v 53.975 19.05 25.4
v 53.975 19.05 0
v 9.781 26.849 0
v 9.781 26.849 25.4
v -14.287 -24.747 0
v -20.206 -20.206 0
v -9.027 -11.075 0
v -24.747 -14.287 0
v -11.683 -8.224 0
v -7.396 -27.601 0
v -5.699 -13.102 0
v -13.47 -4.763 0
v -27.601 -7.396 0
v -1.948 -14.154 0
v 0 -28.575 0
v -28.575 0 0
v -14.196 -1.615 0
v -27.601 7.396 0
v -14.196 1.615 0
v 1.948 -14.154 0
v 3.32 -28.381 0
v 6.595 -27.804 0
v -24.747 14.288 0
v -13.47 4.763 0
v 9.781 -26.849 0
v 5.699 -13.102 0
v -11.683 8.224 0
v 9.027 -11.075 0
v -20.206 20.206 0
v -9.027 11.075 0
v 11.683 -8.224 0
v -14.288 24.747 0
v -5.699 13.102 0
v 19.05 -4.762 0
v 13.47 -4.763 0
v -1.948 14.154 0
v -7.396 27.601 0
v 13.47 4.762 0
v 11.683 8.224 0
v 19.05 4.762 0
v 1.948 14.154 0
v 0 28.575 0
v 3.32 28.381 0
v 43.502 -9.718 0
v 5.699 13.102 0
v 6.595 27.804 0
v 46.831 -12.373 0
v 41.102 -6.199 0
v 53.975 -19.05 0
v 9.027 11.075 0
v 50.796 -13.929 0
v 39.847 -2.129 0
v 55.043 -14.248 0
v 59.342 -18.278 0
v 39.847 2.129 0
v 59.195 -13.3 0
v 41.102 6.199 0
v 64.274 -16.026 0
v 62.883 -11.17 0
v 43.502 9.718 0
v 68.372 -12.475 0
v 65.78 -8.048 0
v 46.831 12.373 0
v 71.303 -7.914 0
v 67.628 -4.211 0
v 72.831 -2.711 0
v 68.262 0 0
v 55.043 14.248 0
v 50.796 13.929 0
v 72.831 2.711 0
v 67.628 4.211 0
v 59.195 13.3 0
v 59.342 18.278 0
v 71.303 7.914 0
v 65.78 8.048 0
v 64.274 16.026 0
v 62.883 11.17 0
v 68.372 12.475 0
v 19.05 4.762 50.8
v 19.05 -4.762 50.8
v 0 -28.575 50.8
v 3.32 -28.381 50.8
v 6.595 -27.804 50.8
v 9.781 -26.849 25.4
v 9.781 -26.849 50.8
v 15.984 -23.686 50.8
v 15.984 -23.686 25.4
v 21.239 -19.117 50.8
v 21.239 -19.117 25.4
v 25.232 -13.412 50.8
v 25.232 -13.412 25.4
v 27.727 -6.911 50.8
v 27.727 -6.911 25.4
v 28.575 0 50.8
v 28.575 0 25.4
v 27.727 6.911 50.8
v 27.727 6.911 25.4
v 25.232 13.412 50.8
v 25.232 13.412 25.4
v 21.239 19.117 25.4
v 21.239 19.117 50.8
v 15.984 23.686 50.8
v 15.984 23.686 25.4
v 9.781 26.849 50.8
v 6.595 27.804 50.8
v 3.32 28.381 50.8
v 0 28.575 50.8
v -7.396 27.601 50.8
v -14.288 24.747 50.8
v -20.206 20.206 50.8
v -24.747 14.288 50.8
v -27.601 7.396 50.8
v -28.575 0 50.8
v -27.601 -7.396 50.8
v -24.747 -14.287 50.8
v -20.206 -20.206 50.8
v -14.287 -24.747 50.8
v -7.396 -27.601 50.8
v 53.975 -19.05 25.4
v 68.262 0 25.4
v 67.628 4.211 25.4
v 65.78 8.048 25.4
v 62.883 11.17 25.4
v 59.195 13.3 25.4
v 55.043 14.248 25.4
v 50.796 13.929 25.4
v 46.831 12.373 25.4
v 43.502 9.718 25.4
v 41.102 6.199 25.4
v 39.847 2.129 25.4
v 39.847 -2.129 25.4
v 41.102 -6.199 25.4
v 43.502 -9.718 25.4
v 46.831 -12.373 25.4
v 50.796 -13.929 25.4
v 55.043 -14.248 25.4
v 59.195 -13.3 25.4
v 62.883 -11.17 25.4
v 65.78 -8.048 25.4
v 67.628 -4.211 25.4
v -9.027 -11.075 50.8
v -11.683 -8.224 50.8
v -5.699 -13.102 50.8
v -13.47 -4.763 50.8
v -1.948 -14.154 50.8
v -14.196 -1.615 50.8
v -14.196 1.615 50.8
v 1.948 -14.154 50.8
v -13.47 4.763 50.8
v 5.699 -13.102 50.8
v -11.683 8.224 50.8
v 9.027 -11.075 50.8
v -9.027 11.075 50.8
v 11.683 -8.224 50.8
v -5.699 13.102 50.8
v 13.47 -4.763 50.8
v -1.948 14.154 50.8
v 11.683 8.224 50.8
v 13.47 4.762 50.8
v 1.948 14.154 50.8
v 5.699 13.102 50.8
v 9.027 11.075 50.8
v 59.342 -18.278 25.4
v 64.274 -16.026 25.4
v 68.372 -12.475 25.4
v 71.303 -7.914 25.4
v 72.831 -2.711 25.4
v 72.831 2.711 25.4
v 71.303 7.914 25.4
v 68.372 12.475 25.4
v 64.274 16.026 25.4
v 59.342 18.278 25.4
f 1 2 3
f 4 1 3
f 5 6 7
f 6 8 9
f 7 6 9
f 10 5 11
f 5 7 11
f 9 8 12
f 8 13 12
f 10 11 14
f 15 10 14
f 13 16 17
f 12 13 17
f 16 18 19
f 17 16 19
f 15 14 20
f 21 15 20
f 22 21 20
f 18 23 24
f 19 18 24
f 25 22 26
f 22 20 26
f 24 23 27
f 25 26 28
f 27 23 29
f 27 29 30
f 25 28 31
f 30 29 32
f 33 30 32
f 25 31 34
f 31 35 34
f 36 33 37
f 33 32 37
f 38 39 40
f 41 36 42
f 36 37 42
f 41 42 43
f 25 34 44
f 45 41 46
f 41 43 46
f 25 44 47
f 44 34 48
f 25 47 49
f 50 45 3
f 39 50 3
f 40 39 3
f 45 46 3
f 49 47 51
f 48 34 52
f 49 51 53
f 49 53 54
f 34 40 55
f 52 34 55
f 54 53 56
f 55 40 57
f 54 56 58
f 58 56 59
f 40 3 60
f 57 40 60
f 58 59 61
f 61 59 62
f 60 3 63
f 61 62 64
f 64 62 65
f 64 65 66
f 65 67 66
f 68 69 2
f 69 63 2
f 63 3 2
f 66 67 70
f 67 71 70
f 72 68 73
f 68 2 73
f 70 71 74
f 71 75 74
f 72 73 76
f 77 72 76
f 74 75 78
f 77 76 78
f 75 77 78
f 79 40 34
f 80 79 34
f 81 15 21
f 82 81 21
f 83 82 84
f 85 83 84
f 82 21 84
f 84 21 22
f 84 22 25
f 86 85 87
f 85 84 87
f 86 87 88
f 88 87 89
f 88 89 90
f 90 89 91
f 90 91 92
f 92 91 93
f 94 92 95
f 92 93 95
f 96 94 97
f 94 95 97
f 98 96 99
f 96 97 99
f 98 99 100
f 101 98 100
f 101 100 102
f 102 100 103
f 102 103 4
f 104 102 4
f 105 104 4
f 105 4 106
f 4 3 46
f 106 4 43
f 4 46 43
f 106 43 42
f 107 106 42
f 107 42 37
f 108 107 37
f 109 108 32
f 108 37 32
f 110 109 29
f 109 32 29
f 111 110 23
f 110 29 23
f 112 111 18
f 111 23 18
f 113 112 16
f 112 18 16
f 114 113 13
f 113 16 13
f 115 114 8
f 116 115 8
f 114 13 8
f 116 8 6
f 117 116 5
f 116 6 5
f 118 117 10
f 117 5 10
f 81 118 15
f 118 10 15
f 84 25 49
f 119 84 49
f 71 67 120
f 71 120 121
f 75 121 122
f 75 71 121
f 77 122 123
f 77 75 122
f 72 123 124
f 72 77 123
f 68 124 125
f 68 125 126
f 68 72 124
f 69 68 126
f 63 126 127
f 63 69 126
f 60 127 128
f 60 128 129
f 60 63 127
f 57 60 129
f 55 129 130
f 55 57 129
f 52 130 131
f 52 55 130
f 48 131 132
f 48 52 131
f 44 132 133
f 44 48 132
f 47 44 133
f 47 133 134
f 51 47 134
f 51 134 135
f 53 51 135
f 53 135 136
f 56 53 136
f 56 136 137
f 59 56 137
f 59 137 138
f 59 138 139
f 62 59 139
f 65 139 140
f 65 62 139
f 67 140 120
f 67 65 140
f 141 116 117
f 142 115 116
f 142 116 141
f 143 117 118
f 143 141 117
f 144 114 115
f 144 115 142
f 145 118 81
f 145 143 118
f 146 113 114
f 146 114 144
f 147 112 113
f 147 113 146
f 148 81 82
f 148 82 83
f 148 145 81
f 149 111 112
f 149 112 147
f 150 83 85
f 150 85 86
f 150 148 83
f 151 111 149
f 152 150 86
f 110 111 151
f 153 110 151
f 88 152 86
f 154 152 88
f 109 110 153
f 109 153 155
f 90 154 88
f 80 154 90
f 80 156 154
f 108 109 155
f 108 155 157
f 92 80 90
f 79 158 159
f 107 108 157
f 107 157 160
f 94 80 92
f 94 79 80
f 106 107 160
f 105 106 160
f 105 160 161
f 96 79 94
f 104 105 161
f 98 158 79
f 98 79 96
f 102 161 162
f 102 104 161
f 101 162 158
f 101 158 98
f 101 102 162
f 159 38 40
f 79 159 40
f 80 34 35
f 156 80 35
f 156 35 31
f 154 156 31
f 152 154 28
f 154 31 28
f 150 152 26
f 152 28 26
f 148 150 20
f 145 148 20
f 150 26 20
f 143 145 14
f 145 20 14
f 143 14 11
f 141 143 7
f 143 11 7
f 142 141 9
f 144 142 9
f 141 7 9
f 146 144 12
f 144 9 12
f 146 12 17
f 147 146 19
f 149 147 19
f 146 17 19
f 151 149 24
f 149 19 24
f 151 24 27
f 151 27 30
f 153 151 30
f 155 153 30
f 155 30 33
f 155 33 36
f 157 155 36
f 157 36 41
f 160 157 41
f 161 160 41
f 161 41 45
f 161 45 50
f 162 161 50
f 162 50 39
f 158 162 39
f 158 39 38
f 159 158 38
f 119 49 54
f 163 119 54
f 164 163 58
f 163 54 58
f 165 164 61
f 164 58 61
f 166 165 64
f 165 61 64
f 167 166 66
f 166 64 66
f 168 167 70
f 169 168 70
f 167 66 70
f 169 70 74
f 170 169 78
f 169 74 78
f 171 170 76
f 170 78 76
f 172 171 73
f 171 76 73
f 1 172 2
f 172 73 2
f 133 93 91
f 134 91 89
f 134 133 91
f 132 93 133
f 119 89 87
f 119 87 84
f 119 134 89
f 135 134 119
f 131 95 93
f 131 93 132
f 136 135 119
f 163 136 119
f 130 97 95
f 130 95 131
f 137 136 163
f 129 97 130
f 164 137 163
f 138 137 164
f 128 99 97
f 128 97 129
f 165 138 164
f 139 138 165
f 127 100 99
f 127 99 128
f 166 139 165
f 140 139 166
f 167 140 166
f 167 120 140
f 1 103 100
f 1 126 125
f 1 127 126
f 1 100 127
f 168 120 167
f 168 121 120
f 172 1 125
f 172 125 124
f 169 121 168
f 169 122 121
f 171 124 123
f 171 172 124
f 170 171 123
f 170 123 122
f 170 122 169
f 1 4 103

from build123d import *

# Parameters (mm, degrees)
F0_R     = 14.2875
F1_DEPTH = 25.4
F2_DEPTH = 50.8


with BuildPart() as f1:
    # F0 (on Top) → F1 (new body)
    with BuildSketch(Plane.XY):
        with BuildLine():
            Line((9.780704698, 26.8489932886), (0, 28.575))
            ThreePointArc((0, 28.575), (-28.575, 0), (0, -28.575))
            Line((0, -28.575), (9.780704698, -26.8489932886))
            ThreePointArc((9.780704698, -26.8489932886), (23.4095521288, -16.3866864902), (28.575, 0))
            ThreePointArc((28.575, 0), (23.4095521288, 16.3866864902), (9.780704698, 26.8489932886))
        make_face()
        with BuildLine():
            ThreePointArc((-13.4703841816, 4.7625), (0, 14.2875), (13.4703841816, 4.7625))
            Line((13.4703841816, 4.7625), (19.05, 4.7625))
            Line((19.05, 4.7625), (19.05, -4.7625))
            Line((19.05, -4.7625), (13.4703841816, -4.7625))
            ThreePointArc((13.4703841816, -4.7625), (0, -14.2875), (-13.4703841816, -4.7625))
            Line((-13.4703841816, -4.7625), (-19.05, -4.7625))
            Line((-19.05, -4.7625), (-19.05, 4.7625))
            Line((-19.05, 4.7625), (-13.4703841816, 4.7625))
        make_face(mode=Mode.SUBTRACT)
        with BuildLine():
            ThreePointArc((9.780704698, 26.8489932886), (4.9659159165, 28.1401901932), (0, 28.575))
            Line((0, 28.575), (9.780704698, 26.8489932886))
        make_face()
        with BuildLine():
            Line((53.975, 19.05), (9.780704698, 26.8489932886))
            ThreePointArc((9.780704698, 26.8489932886), (23.4095521288, 16.3866864902), (28.575, 0))
            ThreePointArc((28.575, 0), (23.4095521288, -16.3866864902), (9.780704698, -26.8489932886))
            Line((9.780704698, -26.8489932886), (53.975, -19.05))
            ThreePointArc((53.975, -19.05), (34.925, 0), (53.975, 19.05))
        make_face()
        with BuildLine():
            ThreePointArc((73.025, 0), (67.4453841816, 13.4703841816), (53.975, 19.05))
            ThreePointArc((53.975, 19.05), (34.925, 0), (53.975, -19.05))
            ThreePointArc((53.975, -19.05), (67.4453841816, -13.4703841816), (73.025, 0))
        make_face()
        with Locations((53.975, 0)):
            Circle(F0_R, mode=Mode.SUBTRACT)
        with BuildLine():
            ThreePointArc((-13.4703841816, -4.7625), (-14.2875, 0), (-13.4703841816, 4.7625))
            Line((-13.4703841816, 4.7625), (-19.05, 4.7625))
            Line((-19.05, 4.7625), (-19.05, -4.7625))
            Line((-19.05, -4.7625), (-13.4703841816, -4.7625))
        make_face()
    extrude(amount=F1_DEPTH)

    # F0 (on Top) → F2 (join)
    with BuildSketch(Plane.XY):
        with BuildLine():
            ThreePointArc((9.780704698, 26.8489932886), (4.9659159165, 28.1401901932), (0, 28.575))
            Line((0, 28.575), (9.780704698, 26.8489932886))
        make_face()
        with BuildLine():
            Line((9.780704698, -26.8489932886), (0, -28.575))
            ThreePointArc((0, -28.575), (4.9659159165, -28.1401901932), (9.780704698, -26.8489932886))
        make_face()
        with BuildLine():
            Line((9.780704698, 26.8489932886), (0, 28.575))
            ThreePointArc((0, 28.575), (-28.575, 0), (0, -28.575))
            Line((0, -28.575), (9.780704698, -26.8489932886))
            ThreePointArc((9.780704698, -26.8489932886), (23.4095521288, -16.3866864902), (28.575, 0))
            ThreePointArc((28.575, 0), (23.4095521288, 16.3866864902), (9.780704698, 26.8489932886))
        make_face()
        with BuildLine():
            ThreePointArc((-13.4703841816, 4.7625), (0, 14.2875), (13.4703841816, 4.7625))
            Line((13.4703841816, 4.7625), (19.05, 4.7625))
            Line((19.05, 4.7625), (19.05, -4.7625))
            Line((19.05, -4.7625), (13.4703841816, -4.7625))
            ThreePointArc((13.4703841816, -4.7625), (0, -14.2875), (-13.4703841816, -4.7625))
            Line((-13.4703841816, -4.7625), (-19.05, -4.7625))
            Line((-19.05, -4.7625), (-19.05, 4.7625))
            Line((-19.05, 4.7625), (-13.4703841816, 4.7625))
        make_face(mode=Mode.SUBTRACT)
        with BuildLine():
            ThreePointArc((-13.4703841816, -4.7625), (-14.2875, 0), (-13.4703841816, 4.7625))
            Line((-13.4703841816, 4.7625), (-19.05, 4.7625))
            Line((-19.05, 4.7625), (-19.05, -4.7625))
            Line((-19.05, -4.7625), (-13.4703841816, -4.7625))
        make_face()
    extrude(amount=F2_DEPTH)


solid = f1.part
